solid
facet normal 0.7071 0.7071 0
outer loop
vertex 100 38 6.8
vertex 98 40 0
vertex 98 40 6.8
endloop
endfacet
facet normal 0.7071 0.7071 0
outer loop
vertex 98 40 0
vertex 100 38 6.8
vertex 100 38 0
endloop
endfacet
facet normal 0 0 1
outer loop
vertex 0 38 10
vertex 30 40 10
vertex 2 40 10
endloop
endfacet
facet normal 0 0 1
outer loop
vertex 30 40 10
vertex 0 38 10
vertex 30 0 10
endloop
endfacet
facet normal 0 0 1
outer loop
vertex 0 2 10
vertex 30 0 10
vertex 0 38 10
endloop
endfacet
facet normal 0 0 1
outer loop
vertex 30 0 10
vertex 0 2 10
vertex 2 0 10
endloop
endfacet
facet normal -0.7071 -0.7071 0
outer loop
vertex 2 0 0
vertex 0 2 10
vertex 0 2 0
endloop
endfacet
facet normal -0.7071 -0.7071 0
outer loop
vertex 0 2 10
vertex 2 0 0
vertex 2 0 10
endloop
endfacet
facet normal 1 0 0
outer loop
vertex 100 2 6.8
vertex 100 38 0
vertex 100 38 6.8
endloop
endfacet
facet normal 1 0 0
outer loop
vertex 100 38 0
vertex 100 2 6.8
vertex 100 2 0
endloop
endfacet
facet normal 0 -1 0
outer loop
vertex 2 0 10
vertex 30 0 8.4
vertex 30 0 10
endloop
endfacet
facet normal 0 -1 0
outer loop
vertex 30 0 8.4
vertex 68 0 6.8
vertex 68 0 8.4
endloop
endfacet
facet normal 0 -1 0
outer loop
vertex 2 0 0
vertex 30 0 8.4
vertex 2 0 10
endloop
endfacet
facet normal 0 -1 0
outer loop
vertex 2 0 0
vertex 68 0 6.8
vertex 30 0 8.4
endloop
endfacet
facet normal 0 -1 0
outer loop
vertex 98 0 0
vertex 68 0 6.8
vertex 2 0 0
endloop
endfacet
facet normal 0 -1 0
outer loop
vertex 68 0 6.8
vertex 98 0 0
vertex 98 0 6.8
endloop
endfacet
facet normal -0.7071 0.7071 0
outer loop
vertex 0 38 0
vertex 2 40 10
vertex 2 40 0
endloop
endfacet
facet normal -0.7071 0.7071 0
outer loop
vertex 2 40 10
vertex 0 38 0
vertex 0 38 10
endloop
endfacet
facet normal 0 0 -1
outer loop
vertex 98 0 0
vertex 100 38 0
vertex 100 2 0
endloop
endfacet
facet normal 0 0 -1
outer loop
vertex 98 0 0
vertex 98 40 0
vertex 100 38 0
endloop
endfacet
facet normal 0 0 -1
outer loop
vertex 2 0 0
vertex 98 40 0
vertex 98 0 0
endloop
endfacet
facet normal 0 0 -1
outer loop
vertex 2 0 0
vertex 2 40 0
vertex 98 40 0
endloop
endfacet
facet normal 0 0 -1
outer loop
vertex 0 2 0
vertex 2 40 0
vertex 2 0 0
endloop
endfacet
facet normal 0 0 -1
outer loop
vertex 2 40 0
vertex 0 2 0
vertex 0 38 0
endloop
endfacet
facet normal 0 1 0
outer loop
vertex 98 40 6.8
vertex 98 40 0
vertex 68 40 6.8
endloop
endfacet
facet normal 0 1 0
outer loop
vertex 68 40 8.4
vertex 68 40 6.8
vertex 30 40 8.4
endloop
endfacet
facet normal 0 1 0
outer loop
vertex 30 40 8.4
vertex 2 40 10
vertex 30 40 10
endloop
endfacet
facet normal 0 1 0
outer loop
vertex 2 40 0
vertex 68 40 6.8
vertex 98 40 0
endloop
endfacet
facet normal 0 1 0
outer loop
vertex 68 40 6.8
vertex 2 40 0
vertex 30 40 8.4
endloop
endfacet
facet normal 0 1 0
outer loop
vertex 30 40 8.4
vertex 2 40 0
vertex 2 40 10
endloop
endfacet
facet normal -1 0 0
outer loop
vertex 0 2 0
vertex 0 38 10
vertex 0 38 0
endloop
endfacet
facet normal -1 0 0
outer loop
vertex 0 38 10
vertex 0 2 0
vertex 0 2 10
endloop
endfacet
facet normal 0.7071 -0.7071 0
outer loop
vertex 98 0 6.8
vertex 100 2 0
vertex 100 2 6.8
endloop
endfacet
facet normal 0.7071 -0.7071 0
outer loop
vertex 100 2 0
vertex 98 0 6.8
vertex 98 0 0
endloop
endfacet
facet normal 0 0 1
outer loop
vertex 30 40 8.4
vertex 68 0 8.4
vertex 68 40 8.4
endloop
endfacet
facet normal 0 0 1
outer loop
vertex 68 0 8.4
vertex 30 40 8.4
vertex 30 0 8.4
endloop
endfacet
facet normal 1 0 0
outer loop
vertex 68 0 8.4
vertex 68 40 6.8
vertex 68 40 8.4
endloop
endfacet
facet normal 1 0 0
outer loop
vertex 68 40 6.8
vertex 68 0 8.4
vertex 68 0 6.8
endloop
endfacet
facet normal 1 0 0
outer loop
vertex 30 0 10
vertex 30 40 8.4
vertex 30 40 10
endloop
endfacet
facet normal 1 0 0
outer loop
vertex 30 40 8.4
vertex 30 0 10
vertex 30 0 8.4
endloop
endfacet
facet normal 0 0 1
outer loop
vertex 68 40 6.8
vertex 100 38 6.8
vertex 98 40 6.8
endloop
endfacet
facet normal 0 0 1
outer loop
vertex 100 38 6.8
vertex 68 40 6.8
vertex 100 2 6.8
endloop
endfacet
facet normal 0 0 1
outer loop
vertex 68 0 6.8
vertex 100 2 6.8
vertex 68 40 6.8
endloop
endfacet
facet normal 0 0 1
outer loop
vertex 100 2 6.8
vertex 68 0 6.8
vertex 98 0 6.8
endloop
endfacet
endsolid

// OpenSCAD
$fn = 32;

// ----------------------------------------------------------------------
// Stepped bar: twostep, 100 x 40 x 10/6.8 mm
// ----------------------------------------------------------------------

// --- parameters (mm) ---
bar_l = 100;              // bar length, X
bar_w = 40;               // bar width, Y
plate_t = 10;             // thickness of the thick zone, Z
thin_t = 6.8;             // thickness of the thin zone
corner_c = 2;             // corner chamfer of the bar
step_cut = 3.2;           // material removed from the thin zone
stair1_x = 30;            // position of the first stair
stair2_x = 68;            // position of the second stair
mid_t = 8.4;              // thickness of the middle zone
depth_1 = 1.6;            // depth of cut 1 from the top face
depth_2 = 3.2;            // depth of cut 2 from the top face
fit_tol = 0.1;            // declared fit tolerance (prompt contract)
free_tol = 0.5;           // declared free tolerance (prompt contract)

profile = [[2, 0], [98, 0], [100, 2], [100, 38], [98, 40], [2, 40], [0, 38], [0, 2]];  // primary outline, 8 points, counter clockwise
void_1 = [[30, -1], [68, -1], [68, 41], [30, 41]];  // first stair, 4 points
void_2 = [[68, -1], [101, -1], [101, 41], [68, 41]];  // second stair, 4 points

// --- the one profile operation ---
difference() {
  linear_extrude(height = plate_t) polygon(points = profile);
  translate([0, 0, plate_t - depth_1])
    linear_extrude(height = depth_1 + 1) polygon(points = void_1);
  translate([0, 0, plate_t - depth_2])
    linear_extrude(height = depth_2 + 1) polygon(points = void_2);
}
